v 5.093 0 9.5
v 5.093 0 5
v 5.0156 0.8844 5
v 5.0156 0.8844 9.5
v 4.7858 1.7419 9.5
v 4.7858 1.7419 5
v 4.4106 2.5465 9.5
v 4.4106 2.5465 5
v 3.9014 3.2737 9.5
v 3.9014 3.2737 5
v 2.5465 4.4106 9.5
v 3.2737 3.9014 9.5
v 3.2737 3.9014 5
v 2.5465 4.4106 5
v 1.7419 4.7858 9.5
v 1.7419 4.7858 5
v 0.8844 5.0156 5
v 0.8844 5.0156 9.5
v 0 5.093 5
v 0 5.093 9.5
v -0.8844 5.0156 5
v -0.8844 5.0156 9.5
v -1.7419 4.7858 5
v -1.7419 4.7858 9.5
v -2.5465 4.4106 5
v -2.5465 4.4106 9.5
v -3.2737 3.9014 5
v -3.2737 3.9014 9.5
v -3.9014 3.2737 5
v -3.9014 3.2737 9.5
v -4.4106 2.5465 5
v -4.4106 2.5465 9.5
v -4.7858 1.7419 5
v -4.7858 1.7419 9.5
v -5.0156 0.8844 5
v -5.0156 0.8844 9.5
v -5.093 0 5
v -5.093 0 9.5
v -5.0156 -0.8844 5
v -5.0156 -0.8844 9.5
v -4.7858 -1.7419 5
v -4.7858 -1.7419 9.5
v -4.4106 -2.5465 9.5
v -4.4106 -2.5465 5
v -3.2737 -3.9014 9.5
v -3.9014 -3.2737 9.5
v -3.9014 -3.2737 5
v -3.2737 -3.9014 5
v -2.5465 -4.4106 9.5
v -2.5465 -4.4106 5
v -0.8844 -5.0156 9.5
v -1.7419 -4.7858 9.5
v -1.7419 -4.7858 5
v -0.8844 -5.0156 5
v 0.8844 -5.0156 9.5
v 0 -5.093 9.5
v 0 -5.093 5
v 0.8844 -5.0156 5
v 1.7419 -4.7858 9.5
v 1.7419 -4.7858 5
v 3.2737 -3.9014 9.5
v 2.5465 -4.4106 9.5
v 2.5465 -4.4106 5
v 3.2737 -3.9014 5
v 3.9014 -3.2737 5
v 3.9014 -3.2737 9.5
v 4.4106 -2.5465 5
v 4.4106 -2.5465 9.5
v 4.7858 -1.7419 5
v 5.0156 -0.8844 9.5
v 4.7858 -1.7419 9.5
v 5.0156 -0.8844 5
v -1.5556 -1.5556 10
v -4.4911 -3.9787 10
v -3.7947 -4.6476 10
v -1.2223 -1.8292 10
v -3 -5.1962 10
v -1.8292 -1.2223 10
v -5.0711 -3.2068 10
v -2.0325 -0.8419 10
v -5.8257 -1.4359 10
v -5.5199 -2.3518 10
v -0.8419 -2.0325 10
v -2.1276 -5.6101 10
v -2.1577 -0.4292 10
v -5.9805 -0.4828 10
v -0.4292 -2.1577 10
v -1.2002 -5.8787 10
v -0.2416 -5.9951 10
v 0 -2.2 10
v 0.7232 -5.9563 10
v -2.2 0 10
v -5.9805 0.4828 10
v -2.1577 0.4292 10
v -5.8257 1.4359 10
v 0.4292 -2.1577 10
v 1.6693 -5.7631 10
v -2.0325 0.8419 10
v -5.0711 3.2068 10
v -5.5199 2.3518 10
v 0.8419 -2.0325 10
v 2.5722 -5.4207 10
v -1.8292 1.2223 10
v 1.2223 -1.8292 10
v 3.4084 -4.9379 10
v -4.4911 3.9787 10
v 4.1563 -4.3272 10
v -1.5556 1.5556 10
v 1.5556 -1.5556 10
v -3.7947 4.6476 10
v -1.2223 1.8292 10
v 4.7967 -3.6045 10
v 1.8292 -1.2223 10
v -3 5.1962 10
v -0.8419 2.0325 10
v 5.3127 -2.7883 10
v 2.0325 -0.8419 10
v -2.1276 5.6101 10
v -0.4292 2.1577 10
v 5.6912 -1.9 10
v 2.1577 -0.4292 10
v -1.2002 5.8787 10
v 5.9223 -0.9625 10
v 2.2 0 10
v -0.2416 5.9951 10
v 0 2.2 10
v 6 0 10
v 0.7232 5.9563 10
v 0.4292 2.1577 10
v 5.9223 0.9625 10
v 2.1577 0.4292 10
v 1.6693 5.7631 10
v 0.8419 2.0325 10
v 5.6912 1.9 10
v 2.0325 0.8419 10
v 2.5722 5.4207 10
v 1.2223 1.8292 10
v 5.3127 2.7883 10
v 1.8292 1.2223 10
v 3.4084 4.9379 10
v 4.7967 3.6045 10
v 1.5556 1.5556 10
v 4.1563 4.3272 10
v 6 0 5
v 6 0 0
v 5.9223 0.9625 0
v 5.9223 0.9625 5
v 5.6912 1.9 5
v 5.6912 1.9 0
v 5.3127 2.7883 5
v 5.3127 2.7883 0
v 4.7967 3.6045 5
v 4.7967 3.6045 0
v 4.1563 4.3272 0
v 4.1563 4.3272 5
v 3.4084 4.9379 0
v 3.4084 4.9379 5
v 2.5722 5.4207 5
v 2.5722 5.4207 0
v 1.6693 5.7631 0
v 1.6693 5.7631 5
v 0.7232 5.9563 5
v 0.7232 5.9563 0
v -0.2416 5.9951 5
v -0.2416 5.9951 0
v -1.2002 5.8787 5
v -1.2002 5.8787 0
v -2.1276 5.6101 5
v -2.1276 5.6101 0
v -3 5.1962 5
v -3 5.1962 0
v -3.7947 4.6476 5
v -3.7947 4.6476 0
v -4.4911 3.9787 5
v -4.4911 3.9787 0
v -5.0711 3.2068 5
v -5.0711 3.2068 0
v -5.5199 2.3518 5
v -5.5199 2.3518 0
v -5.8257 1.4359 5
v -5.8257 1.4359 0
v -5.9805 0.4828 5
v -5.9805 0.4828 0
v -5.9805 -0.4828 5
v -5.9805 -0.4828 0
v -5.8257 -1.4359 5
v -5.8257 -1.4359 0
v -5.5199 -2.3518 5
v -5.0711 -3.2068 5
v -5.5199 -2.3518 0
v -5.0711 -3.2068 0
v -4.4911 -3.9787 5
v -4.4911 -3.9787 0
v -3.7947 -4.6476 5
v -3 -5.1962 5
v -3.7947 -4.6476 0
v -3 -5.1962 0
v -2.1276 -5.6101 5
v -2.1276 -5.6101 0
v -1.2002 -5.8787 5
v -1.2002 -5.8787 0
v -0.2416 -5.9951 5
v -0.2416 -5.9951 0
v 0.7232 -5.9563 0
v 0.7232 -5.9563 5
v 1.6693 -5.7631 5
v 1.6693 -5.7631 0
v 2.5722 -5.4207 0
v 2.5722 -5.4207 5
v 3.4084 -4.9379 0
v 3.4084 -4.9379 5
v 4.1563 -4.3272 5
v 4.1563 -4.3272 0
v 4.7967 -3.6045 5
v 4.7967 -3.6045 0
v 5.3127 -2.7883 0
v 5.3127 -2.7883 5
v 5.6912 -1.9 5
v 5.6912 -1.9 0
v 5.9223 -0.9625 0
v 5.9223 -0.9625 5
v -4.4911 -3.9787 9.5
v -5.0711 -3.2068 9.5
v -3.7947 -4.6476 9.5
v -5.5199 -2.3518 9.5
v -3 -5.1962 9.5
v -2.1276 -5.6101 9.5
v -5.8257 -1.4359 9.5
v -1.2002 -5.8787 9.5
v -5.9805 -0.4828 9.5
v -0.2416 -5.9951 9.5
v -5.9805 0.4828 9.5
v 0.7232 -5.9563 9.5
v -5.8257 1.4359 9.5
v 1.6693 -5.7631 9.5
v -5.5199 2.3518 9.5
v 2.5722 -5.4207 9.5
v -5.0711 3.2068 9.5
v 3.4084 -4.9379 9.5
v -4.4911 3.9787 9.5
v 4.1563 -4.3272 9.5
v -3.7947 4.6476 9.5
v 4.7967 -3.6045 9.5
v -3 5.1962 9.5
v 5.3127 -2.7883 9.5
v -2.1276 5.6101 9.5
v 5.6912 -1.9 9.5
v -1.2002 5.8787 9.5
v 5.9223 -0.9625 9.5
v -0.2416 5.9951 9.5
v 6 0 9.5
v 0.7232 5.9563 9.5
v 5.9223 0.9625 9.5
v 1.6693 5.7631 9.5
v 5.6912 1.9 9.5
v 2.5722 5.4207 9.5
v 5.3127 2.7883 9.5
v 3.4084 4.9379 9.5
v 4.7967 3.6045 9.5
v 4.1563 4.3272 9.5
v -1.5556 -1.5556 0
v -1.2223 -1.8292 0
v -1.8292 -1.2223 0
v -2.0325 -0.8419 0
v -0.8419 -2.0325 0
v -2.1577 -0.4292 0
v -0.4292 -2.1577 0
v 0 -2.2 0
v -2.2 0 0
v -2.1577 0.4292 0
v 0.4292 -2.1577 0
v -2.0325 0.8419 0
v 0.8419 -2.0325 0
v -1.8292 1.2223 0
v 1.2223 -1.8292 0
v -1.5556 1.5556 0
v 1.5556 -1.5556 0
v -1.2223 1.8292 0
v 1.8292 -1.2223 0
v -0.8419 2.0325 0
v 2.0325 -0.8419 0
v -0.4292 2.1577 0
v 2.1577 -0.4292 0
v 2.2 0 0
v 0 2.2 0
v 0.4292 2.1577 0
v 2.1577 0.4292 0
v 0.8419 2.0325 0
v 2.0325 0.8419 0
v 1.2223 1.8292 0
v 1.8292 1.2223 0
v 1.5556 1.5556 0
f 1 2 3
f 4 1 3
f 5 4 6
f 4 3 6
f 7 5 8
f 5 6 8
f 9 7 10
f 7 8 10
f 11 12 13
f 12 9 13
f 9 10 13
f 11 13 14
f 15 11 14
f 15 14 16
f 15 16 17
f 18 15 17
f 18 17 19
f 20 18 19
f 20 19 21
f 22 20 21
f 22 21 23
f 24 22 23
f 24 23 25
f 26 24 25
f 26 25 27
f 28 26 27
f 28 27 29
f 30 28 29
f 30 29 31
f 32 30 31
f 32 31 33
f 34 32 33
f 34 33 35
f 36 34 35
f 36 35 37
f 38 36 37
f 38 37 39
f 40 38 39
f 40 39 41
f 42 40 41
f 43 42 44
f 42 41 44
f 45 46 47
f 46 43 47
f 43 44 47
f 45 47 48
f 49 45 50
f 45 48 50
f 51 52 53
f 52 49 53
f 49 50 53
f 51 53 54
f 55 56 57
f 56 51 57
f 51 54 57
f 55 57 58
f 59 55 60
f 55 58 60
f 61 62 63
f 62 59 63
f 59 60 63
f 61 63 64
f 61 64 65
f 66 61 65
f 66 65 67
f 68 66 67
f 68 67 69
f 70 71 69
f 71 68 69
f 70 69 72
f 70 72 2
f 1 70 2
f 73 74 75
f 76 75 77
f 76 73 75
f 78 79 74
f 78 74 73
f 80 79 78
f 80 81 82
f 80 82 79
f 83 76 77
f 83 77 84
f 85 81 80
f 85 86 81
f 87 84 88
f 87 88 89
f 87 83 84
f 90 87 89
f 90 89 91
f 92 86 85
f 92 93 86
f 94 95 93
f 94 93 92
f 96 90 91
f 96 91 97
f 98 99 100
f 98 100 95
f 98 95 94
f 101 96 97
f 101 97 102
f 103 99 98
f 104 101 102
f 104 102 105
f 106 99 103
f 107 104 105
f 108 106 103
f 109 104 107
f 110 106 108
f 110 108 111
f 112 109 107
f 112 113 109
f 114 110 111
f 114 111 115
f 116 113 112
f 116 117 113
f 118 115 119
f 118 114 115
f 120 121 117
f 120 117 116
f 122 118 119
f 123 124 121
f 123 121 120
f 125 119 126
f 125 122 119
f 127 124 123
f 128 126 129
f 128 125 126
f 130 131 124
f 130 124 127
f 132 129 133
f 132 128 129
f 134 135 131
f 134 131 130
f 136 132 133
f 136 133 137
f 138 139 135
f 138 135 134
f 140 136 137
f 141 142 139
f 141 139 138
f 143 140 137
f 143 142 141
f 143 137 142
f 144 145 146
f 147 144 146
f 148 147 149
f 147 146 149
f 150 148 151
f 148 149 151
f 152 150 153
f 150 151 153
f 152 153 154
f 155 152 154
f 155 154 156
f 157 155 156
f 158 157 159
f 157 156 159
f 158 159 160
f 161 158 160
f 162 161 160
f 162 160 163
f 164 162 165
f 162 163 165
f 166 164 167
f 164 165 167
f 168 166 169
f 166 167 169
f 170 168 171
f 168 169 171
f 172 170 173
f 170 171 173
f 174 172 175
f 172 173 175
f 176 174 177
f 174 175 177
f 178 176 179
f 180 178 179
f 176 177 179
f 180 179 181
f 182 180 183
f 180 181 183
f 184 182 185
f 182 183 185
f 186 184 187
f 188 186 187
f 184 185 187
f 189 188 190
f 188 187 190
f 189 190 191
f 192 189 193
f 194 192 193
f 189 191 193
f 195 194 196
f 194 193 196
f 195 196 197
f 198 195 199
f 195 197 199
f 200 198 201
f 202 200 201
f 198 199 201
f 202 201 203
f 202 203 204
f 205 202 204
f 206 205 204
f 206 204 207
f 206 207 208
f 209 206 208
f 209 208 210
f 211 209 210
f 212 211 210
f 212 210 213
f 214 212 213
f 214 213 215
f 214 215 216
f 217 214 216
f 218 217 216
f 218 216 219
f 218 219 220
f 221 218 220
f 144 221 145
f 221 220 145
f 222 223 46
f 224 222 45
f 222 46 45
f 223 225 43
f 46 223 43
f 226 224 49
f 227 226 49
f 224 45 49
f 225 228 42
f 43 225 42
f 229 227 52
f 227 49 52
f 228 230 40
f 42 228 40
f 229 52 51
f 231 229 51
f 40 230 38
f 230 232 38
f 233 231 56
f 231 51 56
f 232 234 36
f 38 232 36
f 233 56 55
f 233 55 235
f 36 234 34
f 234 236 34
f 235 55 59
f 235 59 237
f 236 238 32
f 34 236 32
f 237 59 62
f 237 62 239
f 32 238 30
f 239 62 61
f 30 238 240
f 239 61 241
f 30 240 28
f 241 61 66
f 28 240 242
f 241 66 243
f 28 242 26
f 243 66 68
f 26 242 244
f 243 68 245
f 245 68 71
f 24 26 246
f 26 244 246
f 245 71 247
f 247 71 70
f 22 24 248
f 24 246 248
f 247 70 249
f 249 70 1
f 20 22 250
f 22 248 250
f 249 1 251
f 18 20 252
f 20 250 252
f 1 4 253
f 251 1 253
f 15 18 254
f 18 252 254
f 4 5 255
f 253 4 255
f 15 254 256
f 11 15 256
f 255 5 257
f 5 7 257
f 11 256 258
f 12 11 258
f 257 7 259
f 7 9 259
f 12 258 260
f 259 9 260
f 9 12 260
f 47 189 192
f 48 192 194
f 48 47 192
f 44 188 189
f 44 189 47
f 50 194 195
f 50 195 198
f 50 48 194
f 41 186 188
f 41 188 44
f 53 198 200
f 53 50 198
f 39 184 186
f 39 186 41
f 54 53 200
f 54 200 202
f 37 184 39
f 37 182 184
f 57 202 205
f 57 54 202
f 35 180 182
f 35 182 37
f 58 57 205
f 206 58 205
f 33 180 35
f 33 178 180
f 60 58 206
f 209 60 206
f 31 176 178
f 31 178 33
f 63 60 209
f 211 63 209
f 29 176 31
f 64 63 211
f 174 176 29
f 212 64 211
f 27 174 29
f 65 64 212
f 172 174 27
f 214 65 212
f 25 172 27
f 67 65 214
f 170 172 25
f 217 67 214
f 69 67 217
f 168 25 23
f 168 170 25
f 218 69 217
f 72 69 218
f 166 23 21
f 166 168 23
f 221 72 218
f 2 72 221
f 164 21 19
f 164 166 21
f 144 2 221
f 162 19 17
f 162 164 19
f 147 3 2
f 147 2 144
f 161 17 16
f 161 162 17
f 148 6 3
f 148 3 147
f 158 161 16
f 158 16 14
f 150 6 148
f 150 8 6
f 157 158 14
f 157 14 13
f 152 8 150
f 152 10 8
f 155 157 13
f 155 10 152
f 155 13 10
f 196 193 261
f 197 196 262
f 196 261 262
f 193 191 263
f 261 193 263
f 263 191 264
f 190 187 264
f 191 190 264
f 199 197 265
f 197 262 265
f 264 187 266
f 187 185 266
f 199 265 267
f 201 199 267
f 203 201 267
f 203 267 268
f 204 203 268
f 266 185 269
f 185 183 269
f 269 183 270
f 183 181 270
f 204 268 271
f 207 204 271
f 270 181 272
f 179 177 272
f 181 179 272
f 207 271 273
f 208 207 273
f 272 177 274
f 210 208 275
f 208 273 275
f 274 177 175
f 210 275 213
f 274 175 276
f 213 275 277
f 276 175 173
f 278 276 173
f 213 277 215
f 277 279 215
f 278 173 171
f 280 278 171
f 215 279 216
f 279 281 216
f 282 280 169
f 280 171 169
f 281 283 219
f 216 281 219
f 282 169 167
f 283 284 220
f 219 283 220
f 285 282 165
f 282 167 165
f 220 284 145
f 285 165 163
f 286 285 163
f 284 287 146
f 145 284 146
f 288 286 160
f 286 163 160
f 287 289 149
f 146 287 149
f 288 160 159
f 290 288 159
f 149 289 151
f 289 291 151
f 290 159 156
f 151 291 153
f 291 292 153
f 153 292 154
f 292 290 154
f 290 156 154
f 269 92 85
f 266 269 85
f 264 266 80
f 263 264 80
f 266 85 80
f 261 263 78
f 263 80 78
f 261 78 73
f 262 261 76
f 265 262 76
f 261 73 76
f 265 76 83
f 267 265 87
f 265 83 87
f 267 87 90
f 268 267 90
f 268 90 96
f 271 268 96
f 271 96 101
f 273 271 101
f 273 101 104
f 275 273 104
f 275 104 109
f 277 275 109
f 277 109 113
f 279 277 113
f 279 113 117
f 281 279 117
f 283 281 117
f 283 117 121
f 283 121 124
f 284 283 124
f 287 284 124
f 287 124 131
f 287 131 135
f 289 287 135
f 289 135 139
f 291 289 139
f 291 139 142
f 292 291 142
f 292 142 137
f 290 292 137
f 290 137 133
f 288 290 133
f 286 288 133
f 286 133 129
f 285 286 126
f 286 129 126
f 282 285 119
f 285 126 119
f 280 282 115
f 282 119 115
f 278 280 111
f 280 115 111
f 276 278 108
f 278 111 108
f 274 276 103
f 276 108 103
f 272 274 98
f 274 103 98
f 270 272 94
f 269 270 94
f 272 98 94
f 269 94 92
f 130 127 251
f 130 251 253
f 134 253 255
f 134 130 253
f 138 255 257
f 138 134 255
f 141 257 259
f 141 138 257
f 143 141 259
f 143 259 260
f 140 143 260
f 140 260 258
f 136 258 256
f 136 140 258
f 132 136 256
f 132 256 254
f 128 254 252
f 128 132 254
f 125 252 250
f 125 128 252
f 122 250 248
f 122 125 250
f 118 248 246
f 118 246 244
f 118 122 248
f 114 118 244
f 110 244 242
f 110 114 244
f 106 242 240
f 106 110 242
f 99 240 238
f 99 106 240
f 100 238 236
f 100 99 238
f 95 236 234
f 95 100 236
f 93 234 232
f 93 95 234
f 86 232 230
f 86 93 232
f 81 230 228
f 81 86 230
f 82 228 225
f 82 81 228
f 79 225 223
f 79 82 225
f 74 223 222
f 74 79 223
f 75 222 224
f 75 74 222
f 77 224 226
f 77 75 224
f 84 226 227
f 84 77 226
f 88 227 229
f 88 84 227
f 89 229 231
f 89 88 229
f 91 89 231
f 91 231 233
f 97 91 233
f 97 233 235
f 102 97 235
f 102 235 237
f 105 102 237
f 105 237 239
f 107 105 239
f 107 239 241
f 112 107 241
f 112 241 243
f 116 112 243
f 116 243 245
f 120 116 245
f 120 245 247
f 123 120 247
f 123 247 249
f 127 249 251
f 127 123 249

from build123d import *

# Parameters (mm, degrees)
F0_R     = 6
F0_R_2   = 5.0929581789
F1_DEPTH = 5
F2_DEPTH = 10
F3_R     = 6
F3_R_2   = 5.0929581789
F4_DEPTH = 0.5
F5_D     = 4.4


with BuildPart() as f1:
    # F0 (on Top) → F1 (new body)
    with BuildSketch(Plane.XY):
        Circle(F0_R)
        Circle(F0_R_2, mode=Mode.SUBTRACT)
        Circle(F0_R_2)
    extrude(amount=F1_DEPTH)

    # F0 (on Top) → F2 (join)
    with BuildSketch(Plane.XY):
        Circle(F0_R_2)
    extrude(amount=F2_DEPTH)

    # F3 (on face) → F4 (join)
    with BuildSketch(Plane.XY.offset(10)):
        Circle(F3_R)
        Circle(F3_R_2, mode=Mode.SUBTRACT)
        Circle(F3_R_2)
    extrude(amount=-F4_DEPTH)

    # F5 (through all)
    with Locations(Plane(origin=(0, 0, 0), x_dir=(1, 0, 0), z_dir=(0, 0, -1))):
        with Locations((0, 0)):
            Hole(F5_D / 2)


solid = f1.part
